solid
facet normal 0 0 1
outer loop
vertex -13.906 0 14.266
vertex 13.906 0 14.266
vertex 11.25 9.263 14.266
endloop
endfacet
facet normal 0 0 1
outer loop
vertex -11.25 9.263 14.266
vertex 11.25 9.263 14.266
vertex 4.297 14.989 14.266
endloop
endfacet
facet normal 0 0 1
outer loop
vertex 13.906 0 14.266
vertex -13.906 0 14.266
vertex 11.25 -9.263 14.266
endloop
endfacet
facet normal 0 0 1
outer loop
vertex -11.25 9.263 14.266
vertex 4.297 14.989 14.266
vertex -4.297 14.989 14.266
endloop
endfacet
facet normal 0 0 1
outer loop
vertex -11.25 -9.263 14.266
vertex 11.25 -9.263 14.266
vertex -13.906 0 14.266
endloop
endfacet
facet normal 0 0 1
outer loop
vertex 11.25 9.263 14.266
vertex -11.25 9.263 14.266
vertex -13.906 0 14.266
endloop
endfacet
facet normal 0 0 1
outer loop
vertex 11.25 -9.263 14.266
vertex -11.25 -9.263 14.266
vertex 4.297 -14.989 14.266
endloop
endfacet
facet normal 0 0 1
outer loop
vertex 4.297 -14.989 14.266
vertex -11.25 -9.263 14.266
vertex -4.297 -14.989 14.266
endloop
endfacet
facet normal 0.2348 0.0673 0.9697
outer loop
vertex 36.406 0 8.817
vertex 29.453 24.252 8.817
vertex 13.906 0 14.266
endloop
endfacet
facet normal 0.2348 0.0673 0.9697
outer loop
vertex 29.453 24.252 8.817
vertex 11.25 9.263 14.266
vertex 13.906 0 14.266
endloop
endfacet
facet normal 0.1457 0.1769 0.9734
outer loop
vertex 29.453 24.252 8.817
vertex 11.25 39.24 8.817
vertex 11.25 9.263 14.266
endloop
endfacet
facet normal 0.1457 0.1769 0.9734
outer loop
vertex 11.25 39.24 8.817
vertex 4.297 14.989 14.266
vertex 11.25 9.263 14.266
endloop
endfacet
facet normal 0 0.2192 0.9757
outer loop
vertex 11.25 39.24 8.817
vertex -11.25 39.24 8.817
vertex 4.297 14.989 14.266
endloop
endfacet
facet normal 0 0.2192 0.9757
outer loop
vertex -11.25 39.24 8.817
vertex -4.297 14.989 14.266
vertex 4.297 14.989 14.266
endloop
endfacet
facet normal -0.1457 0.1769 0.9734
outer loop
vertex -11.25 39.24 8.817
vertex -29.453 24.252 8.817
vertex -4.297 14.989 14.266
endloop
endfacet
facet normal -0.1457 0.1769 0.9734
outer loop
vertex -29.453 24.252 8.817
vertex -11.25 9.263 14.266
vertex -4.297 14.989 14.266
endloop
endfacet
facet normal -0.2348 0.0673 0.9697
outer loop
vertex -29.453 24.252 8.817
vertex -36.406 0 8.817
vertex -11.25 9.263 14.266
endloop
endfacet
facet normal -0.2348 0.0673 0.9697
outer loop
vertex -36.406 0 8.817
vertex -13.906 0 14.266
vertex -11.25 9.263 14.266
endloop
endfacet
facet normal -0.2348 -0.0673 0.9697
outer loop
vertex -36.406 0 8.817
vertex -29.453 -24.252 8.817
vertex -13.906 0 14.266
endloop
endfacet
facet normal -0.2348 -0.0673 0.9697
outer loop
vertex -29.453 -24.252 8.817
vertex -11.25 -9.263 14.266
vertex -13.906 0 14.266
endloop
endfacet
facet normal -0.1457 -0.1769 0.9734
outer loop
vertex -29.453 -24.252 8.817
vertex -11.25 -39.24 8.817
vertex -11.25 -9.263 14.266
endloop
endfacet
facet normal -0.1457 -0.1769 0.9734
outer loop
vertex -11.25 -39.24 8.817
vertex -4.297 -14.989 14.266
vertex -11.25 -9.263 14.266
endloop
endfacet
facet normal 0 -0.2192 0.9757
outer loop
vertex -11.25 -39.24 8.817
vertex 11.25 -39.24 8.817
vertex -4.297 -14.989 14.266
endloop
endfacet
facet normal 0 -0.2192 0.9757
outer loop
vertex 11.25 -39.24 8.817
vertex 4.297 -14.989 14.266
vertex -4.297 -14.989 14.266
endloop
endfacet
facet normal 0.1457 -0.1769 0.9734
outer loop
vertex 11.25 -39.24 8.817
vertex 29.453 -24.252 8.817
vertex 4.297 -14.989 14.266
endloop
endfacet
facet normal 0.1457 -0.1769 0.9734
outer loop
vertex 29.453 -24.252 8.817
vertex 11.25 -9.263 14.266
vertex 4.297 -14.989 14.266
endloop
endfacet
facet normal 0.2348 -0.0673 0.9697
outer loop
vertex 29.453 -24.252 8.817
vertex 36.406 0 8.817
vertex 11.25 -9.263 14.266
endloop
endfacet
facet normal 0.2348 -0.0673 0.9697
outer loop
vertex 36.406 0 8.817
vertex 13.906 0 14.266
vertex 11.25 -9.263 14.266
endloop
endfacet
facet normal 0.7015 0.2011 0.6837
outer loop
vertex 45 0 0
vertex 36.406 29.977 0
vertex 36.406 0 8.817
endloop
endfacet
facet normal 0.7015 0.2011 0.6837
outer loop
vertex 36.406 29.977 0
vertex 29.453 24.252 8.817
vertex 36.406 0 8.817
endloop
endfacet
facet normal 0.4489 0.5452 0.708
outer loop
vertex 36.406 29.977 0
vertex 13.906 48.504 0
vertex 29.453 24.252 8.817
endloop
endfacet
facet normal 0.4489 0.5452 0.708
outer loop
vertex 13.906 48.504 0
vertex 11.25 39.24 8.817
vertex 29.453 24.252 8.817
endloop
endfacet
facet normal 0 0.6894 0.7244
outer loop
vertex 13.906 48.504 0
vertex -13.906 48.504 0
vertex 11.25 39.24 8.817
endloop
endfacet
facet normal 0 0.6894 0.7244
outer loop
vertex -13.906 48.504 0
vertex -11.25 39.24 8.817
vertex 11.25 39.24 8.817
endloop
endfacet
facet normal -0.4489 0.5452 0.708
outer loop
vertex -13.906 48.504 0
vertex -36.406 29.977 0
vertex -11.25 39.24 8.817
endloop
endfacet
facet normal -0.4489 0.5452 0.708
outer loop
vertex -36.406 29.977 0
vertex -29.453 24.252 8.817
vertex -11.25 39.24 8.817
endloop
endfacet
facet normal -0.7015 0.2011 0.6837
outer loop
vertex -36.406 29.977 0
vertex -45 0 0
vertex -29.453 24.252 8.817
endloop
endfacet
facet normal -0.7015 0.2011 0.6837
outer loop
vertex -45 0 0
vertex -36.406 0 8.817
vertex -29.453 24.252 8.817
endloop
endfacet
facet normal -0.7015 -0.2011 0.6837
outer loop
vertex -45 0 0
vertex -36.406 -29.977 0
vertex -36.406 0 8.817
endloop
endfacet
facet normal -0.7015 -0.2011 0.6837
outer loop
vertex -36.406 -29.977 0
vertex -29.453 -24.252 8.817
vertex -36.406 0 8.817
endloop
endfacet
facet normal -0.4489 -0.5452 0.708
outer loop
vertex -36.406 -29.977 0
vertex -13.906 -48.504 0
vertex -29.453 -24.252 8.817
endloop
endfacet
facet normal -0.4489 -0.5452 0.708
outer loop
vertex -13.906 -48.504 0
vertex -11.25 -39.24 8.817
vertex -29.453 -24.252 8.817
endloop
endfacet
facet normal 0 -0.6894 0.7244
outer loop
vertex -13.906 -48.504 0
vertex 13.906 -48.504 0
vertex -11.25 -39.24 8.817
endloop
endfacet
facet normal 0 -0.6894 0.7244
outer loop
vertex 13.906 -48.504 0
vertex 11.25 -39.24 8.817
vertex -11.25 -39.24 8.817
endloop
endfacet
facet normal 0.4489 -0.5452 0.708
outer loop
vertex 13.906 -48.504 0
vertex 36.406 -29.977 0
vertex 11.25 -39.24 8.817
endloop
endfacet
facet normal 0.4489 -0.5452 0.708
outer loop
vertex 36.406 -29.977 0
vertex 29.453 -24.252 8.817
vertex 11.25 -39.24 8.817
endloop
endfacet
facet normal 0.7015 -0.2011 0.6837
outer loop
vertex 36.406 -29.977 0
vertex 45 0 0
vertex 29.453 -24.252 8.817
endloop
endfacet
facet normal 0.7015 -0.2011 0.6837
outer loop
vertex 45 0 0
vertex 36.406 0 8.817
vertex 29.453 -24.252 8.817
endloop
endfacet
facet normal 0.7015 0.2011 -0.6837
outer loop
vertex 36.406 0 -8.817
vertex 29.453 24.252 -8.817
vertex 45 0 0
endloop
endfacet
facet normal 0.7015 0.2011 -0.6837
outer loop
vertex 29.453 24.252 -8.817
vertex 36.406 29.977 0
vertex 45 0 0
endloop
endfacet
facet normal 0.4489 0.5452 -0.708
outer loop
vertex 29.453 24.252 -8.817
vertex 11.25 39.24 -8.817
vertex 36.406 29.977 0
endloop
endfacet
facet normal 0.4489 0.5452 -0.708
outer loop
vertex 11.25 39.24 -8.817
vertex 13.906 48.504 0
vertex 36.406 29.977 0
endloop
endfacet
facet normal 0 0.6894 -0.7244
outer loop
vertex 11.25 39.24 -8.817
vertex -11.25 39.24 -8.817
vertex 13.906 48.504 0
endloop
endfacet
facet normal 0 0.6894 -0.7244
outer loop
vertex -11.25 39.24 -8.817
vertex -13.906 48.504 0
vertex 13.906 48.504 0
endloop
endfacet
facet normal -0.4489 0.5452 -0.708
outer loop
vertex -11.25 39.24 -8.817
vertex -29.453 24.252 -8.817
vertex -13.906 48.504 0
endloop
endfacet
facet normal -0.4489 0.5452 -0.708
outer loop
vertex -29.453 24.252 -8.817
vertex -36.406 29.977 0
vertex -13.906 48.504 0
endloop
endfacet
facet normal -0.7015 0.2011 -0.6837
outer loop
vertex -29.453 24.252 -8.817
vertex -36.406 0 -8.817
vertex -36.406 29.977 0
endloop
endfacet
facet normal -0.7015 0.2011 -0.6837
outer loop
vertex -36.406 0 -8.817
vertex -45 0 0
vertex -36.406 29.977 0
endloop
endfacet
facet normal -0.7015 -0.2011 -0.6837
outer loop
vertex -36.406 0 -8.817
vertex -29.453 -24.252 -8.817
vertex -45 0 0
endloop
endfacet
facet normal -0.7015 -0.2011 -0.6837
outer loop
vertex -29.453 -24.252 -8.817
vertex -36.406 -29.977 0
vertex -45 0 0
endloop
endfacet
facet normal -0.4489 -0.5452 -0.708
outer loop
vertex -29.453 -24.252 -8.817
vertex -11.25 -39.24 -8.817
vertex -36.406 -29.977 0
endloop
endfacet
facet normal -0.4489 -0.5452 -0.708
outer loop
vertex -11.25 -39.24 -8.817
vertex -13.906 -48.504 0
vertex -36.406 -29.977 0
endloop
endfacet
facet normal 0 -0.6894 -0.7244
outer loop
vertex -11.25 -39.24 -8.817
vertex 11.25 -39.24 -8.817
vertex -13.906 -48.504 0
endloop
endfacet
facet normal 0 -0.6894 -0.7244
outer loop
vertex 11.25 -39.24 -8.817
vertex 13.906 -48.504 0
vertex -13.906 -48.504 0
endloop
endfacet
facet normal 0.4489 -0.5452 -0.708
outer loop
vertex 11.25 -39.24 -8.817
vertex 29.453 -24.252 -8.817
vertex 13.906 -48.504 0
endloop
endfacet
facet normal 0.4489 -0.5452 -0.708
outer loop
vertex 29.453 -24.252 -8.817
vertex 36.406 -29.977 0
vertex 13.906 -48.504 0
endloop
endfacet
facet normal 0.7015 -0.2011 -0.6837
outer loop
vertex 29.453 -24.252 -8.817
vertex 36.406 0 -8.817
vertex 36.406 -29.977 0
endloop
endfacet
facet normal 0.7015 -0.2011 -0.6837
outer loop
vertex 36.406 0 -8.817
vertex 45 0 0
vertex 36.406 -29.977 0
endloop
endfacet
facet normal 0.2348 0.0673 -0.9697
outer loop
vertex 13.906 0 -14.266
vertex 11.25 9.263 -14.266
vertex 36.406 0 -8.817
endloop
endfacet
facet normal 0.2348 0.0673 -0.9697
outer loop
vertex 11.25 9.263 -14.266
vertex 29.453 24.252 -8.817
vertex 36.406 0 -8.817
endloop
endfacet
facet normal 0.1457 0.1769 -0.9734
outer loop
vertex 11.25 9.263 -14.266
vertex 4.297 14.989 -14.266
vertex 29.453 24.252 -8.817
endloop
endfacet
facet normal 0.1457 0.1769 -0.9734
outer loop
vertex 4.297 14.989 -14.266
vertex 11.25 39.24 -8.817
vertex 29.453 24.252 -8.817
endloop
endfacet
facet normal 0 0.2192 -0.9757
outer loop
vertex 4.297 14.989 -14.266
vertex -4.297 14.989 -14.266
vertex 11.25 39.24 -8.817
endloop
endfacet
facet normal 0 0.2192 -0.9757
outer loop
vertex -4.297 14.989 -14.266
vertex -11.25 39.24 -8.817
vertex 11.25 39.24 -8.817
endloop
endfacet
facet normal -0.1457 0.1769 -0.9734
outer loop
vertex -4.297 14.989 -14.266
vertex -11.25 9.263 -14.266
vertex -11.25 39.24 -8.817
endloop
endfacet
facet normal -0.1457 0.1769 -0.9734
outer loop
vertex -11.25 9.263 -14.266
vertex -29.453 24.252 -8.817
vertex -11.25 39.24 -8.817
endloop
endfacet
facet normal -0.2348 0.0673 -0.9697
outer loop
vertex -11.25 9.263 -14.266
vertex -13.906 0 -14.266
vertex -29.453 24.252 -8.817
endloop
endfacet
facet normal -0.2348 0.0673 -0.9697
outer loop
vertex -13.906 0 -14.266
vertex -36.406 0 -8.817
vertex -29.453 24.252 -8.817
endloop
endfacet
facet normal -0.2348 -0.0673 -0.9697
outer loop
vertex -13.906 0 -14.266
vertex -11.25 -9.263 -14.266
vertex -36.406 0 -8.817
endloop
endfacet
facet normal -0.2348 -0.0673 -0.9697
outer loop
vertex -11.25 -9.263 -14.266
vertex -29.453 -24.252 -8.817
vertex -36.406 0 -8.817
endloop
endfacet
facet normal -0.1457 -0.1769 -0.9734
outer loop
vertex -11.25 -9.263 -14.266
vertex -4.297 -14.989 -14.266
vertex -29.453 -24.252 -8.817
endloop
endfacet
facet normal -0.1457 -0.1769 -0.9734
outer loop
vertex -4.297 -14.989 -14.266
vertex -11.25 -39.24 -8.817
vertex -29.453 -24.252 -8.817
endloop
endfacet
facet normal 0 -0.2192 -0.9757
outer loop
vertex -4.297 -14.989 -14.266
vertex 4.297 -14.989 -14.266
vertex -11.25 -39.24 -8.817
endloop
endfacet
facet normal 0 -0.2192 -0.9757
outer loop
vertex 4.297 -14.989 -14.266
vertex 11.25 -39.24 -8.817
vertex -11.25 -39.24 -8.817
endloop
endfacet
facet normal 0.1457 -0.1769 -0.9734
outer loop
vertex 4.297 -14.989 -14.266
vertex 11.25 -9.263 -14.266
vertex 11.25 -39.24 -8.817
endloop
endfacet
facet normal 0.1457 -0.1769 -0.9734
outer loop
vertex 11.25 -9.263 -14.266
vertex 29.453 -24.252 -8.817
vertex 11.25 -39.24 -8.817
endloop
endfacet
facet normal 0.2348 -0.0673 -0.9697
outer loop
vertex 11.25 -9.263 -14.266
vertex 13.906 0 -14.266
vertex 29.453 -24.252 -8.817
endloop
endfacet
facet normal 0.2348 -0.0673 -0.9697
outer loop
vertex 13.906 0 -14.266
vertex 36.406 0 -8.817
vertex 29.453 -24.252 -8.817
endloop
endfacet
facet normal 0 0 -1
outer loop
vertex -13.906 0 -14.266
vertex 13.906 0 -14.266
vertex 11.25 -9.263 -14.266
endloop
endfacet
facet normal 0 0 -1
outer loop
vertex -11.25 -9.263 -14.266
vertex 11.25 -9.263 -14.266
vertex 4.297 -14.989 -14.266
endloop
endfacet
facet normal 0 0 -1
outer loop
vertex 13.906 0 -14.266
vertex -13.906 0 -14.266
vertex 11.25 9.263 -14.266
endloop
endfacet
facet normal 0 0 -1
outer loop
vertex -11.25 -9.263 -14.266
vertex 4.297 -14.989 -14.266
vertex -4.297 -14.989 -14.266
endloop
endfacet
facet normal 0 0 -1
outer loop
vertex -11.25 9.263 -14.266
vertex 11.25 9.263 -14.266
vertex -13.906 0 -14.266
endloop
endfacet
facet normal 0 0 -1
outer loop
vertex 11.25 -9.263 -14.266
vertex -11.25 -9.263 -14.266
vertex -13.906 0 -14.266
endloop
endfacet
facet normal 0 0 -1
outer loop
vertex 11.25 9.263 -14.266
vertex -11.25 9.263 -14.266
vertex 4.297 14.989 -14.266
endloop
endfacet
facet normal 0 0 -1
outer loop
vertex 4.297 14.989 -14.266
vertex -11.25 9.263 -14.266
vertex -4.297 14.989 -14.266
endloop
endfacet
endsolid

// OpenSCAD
// Generated by SolidPython 1.0.1 on 2020-07-29 00:46:52


scale(v = [15, 17, 5]) {
	sphere(r = 3);
}
/***********************************************
*********      SolidPython code:      **********
************************************************
 
# import packages: SolidPython
from solid import *
from solid.utils import *
from itertools import chain, combinations, permutations


class Resize:

    def __init__(self, scad_file):
        self.scad_file = scad_file
        #self.scad_file = import_scad(scad_file)
        # cone/cylinder param:
        self.r1 = 0
        self.r2 = 0
        self.h = 0
        # rectangular prism param:
        self.w = 0
        self.l = 0
        # ellipse param:
        self.r = 0

    # import OpenScad code (file name corresponds to shape)


    # classify shape + parameters
    def assign(self, param1, param2, param3):
        if self.scad_file == 'cone.scad':
            self.r1 = param1
            self.r2 = param2
            self.h = param3
        elif self.scad_file == 'cylinder.scad':
            self.r1 = param1
            self.r2 = param2
            self.h = param3
        elif self.scad_file == 'rectangularPrism.scad':
            self.h = param1
            self.l = param2
            self.w = param3
        else:
            self.r = param1
            self.h = param2

    # resize parameters
    def iterate(self):
        x = range(3, 20, 2)
        i = 1
        if self.scad_file == 'cone.scad':
            tempList = list(permutations(x, 2))
            for temp in tempList:
                param1 = temp[0]
                param2 = temp[1]
                filepath = 'produced_scad_files/' + 'cone' + str(param1) + '_' + str(param2) + '_' + '.scad'
                scad_render_to_file(cylinder(h=param1, r1=param2, r2=0), filepath)

        elif self.scad_file == 'cylinder.scad':
            tempList = list(permutations(x, 3))
            for temp in tempList:
                param1 = temp[0]
                param2 = temp[1]
                filepath = 'produced_scad_files/' + 'cylinder' + str(param1) + '_' + str(param2) + '_' + '.scad'
                scad_render_to_file(cylinder(h=param1, r1=param2, r2=param2), filepath)

        elif self.scad_file == 'rectangularPrism.scad':
            tempList = list(permutations(x, 3))
            for temp in tempList:
                param1 = temp[0]
                param2 = temp[1]
                param3 = temp[2]
                filepath = 'produced_scad_files/' + 'rectangularPrism' + str(param1) + '_' + str(param2) + '_' + str(
                    param3) + '.scad'
                scad_render_to_file(cube(size=(param1, param2, param3)), filepath)

        elif self.scad_file == 'ellipse.scad':
            tempList = list(permutations(x, 4))
            for temp in tempList:
                param1 = temp[0]
                param2 = temp[1]
                param3 = temp[2]
                param4 = temp[3]
                filepath = 'produced_scad_files/' + 'ellipse' + str(param1) + '_' + str(param2) + '_' + str(param3) + '_' + str(param4) + '.scad'
                scad_render_to_file(scale([param1, param2, param3])(sphere(r=param4)), filepath)

    def render_to_scadfile(self):
        scad_render_to_file(scad, 'example.scad') 
 
************************************************/
